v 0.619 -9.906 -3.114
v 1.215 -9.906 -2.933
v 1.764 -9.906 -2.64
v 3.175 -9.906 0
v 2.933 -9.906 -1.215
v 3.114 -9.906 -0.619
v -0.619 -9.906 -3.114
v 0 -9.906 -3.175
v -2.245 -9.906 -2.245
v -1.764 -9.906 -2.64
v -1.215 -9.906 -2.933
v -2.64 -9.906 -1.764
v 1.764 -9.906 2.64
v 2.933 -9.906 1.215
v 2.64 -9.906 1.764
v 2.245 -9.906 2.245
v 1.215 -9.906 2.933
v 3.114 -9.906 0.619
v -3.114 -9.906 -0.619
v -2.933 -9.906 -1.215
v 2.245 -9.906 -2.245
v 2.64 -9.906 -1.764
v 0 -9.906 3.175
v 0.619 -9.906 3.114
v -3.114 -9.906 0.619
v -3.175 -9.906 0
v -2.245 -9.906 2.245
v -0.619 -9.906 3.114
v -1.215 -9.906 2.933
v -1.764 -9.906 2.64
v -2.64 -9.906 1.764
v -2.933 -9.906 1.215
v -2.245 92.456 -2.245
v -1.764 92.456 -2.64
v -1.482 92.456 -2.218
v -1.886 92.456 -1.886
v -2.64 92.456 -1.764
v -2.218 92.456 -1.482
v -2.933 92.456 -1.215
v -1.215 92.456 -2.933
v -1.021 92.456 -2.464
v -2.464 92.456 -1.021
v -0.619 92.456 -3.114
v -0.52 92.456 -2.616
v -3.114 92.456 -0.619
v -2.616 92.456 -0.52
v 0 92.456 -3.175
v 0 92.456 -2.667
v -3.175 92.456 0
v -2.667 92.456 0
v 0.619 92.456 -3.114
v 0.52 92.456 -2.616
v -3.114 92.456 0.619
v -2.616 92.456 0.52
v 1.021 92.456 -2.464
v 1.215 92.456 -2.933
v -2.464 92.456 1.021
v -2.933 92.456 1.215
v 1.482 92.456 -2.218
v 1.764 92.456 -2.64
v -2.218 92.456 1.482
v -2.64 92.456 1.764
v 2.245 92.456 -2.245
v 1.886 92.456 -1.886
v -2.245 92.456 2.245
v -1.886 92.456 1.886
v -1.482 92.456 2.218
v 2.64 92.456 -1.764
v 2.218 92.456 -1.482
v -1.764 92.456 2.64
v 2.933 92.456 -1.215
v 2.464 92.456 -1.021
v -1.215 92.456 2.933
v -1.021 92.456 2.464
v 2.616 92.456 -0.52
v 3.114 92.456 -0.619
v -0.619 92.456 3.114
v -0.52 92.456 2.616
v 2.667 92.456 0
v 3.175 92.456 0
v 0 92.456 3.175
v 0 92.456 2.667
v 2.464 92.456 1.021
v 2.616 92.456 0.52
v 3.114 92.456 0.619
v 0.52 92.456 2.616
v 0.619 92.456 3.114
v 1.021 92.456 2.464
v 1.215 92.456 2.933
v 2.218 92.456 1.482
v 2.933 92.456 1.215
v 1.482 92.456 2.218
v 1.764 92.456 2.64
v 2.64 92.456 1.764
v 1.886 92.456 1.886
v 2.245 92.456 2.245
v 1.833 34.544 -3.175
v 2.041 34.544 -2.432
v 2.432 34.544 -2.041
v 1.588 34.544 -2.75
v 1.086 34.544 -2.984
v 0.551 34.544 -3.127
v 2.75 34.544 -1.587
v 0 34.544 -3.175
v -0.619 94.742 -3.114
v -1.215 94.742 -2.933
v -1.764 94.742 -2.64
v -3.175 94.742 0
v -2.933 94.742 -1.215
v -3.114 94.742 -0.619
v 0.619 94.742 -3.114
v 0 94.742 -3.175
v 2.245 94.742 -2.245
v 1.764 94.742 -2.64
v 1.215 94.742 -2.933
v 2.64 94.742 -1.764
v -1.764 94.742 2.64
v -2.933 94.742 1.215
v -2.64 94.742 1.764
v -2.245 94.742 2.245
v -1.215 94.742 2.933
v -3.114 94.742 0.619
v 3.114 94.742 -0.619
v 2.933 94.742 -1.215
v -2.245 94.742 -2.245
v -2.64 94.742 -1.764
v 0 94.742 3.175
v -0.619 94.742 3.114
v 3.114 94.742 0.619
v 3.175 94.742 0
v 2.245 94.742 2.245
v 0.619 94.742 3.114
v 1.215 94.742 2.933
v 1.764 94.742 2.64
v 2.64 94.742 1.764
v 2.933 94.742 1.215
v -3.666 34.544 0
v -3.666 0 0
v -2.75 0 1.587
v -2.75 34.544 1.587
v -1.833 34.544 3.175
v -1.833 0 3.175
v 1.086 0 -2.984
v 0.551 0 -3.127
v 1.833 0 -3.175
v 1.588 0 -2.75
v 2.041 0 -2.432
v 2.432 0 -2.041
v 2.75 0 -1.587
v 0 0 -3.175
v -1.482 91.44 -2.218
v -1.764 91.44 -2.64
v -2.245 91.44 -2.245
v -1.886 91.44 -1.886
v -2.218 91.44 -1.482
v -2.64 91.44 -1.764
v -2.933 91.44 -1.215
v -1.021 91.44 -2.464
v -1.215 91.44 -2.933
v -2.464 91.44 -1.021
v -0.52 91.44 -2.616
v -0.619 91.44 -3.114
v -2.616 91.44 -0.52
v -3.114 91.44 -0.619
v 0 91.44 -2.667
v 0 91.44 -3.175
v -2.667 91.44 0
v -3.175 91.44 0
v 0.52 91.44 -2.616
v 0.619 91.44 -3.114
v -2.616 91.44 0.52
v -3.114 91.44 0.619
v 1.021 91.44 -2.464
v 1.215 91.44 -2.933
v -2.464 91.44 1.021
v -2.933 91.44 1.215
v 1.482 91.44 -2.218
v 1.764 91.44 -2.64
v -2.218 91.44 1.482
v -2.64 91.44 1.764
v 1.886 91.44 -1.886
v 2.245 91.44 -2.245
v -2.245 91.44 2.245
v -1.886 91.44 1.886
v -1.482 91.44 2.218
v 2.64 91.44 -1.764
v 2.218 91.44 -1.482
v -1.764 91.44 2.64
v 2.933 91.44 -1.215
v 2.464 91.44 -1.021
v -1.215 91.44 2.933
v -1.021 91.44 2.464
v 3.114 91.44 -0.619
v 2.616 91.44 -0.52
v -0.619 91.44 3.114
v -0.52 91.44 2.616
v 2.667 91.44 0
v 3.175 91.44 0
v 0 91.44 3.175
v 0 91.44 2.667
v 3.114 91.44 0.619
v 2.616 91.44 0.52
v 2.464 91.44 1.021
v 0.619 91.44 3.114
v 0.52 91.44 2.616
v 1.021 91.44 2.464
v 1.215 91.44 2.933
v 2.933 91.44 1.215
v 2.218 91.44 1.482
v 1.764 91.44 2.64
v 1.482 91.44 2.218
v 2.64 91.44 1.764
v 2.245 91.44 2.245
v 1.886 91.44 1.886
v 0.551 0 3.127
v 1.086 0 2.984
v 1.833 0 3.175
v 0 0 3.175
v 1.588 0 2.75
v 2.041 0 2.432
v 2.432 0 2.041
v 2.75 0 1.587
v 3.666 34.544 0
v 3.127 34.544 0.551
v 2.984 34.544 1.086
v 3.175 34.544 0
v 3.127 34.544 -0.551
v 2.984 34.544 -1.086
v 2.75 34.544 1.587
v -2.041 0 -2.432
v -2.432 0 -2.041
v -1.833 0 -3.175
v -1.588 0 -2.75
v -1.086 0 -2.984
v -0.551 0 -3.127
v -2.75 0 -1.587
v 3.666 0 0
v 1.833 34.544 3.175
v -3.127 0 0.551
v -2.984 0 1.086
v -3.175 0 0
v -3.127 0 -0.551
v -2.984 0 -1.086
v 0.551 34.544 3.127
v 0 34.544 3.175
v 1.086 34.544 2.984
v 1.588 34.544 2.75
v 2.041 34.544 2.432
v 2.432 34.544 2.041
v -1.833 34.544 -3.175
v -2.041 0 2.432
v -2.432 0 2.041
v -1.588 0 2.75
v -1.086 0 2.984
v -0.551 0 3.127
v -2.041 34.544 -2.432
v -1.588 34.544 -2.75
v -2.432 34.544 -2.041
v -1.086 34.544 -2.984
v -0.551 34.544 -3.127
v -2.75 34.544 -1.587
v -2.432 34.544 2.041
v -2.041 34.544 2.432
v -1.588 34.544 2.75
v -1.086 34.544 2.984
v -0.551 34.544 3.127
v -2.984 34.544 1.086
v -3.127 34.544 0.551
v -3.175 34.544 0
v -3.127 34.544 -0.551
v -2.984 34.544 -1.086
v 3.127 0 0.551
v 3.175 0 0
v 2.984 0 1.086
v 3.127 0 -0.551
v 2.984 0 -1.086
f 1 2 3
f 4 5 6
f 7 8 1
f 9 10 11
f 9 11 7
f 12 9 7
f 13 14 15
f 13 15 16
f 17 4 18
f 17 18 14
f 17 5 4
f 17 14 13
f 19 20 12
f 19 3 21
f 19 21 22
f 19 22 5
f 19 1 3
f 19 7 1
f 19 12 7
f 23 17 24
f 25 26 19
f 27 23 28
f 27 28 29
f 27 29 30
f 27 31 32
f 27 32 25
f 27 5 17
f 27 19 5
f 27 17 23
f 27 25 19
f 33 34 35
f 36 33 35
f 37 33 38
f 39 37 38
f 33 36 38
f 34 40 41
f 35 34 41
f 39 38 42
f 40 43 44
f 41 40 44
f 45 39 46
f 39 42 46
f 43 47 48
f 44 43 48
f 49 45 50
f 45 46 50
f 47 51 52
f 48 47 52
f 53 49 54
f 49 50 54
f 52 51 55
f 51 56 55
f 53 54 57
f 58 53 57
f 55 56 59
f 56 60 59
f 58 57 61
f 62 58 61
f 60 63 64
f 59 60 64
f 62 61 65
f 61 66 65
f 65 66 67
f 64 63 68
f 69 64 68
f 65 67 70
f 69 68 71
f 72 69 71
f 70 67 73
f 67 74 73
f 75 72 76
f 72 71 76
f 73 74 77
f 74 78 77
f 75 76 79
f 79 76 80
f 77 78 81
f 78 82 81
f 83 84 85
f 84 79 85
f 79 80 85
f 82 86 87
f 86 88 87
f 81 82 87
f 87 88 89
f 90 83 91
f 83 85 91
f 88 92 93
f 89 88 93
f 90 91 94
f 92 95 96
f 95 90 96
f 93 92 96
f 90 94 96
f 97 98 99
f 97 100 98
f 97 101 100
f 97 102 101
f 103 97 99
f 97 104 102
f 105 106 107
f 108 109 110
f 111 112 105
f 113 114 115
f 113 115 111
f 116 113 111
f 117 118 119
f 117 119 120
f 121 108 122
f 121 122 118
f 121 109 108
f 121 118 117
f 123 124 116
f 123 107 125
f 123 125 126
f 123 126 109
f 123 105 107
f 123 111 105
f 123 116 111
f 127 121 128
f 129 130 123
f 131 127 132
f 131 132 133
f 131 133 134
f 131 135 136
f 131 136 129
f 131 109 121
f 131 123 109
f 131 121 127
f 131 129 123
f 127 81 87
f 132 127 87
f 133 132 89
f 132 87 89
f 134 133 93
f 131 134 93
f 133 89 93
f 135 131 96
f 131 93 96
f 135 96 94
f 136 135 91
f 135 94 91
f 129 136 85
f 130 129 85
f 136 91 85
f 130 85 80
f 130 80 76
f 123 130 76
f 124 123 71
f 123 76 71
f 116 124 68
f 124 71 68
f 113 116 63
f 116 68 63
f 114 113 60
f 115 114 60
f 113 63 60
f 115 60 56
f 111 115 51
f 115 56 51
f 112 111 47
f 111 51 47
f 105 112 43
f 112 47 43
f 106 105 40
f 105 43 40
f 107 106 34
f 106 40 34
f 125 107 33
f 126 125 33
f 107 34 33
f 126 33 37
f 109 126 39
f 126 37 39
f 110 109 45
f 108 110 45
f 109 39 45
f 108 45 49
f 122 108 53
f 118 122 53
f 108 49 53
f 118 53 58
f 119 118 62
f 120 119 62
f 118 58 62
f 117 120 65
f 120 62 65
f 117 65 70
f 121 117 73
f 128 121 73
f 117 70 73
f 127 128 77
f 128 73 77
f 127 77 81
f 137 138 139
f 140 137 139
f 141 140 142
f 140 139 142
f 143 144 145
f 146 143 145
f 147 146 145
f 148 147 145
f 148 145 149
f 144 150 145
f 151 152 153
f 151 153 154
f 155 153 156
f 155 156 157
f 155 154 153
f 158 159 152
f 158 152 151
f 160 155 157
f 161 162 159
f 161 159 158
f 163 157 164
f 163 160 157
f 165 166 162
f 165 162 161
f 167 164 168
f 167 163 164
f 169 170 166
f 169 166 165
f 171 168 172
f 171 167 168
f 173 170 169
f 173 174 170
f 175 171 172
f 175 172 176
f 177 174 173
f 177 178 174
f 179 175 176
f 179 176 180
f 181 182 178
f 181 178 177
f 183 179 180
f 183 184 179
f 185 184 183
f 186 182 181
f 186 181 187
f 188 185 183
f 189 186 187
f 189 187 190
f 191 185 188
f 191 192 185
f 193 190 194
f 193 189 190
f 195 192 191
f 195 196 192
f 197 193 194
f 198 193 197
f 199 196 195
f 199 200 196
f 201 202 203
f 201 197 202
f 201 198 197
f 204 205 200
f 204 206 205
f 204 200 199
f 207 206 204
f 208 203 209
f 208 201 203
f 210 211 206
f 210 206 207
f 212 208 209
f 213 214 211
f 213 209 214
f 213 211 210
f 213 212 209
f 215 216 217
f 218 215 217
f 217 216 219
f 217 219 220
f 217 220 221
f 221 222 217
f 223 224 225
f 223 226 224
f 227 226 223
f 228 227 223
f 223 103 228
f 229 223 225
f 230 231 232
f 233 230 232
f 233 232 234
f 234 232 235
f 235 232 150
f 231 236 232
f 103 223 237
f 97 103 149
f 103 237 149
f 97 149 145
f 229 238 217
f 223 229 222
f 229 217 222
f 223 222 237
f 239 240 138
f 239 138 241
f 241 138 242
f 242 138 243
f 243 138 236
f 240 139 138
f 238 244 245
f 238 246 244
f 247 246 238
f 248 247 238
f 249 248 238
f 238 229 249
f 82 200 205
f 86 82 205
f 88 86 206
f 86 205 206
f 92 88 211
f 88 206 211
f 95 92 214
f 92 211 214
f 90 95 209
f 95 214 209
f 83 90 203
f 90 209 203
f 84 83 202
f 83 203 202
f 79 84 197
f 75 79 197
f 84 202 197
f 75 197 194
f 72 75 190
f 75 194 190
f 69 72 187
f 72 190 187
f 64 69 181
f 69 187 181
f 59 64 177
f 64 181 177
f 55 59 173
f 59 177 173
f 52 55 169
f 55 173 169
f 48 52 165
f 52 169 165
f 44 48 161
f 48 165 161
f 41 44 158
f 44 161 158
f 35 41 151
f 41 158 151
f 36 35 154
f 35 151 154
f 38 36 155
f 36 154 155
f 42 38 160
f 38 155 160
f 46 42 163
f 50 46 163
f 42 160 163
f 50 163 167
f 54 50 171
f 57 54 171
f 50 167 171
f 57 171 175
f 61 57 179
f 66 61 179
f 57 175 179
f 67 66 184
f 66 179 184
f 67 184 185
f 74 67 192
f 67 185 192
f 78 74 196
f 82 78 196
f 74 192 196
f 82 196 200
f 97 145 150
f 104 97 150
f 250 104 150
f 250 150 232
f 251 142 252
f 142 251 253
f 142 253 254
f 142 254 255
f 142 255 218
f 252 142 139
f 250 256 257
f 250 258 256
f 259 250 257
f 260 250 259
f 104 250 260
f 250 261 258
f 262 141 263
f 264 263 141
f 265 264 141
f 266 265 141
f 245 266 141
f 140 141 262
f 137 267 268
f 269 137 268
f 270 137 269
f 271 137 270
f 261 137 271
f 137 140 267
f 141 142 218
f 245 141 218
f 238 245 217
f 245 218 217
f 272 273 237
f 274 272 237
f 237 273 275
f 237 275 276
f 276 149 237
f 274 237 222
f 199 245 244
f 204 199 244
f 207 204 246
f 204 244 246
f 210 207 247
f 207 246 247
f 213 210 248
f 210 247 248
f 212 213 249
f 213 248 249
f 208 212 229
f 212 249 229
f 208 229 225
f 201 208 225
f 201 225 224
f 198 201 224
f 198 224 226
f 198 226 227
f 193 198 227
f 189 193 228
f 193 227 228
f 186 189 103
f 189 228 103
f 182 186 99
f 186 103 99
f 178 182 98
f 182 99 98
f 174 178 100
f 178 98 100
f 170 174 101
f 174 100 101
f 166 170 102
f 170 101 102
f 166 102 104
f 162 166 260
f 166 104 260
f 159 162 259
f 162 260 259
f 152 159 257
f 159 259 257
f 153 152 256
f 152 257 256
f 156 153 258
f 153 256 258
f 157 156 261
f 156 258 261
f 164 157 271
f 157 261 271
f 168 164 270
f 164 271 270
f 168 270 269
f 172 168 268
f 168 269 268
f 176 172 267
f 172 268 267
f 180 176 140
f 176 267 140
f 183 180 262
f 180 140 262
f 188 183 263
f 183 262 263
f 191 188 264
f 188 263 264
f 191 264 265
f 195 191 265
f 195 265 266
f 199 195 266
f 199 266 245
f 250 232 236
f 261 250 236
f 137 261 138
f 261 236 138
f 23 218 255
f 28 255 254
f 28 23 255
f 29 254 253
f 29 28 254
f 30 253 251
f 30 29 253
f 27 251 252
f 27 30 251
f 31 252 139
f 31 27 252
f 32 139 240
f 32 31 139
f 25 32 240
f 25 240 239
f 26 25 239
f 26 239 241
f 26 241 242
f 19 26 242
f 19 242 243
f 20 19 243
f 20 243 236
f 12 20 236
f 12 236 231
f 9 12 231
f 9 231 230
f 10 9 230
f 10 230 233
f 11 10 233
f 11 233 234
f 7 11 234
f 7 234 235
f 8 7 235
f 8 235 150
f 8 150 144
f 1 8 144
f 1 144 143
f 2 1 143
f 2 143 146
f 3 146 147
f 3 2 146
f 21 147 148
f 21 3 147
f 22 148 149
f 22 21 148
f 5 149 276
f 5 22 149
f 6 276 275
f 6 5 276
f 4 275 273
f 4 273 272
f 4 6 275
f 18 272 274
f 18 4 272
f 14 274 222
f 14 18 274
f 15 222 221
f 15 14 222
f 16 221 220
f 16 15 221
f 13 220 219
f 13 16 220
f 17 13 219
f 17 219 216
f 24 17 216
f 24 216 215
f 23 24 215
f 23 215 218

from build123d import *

# Parameters (mm, degrees)
BOSS_EXTRUDE1_DEPTH = 34.544
SKETCH2_R           = 3.175
BOSS_EXTRUDE2_DEPTH = 56.896
SKETCH3_R           = 2.667
BOSS_EXTRUDE3_DEPTH = 1.016
SKETCH4_R           = 3.175
BOSS_EXTRUDE4_DEPTH = 2.286
BOSS_EXTRUDE5_START = 9.906
SKETCH5_R           = 3.175
BOSS_EXTRUDE5_DEPTH = 9.906


with BuildPart() as part:
    # Sketch1 → Boss-Extrude1 (new body)
    with BuildSketch(Plane(origin=(0, 0, 0), x_dir=(1, 0, 0), z_dir=(0, 1, 0))):
        Polygon((1.833087105, 3.175), (-1.833087105, 3.175), (-3.666174209, 0), (-1.833087105, -3.175), (1.833087105, -3.175), (3.666174209, 0), align=None)
    extrude(amount=BOSS_EXTRUDE1_DEPTH)

    # Sketch2 → Boss-Extrude2 (add)
    with BuildSketch(Plane(origin=(0, 34.544, 0), x_dir=(1, 0, 0), z_dir=(0, 1, 0))):
        with Locations(Location((0, 0, 0), (0, 0, 270))):
            Circle(SKETCH2_R)
    extrude(amount=BOSS_EXTRUDE2_DEPTH)

    # Sketch3 → Boss-Extrude3 (add)
    with BuildSketch(Plane(origin=(0, 91.44, 0), x_dir=(1, 0, 0), z_dir=(0, 1, 0))):
        with Locations(Location((0, 0, 0), (0, 0, 270))):
            Circle(SKETCH3_R)
    extrude(amount=BOSS_EXTRUDE3_DEPTH)

    # Sketch4 → Boss-Extrude4 (add)
    with BuildSketch(Plane(origin=(0, 92.456, 0), x_dir=(1, 0, 0), z_dir=(0, 1, 0))):
        with Locations(Location((0, 0, 0), (0, 0, 270))):
            Circle(SKETCH4_R)
    extrude(amount=BOSS_EXTRUDE4_DEPTH)

    # Sketch5 → Boss-Extrude5 (add)
    with BuildSketch(Plane.XZ.offset(BOSS_EXTRUDE5_START)):
        with Locations(Location((0, 0, 0), (0, 0, 90))):
            Circle(SKETCH5_R)
    extrude(amount=-BOSS_EXTRUDE5_DEPTH)


solid = part.part
